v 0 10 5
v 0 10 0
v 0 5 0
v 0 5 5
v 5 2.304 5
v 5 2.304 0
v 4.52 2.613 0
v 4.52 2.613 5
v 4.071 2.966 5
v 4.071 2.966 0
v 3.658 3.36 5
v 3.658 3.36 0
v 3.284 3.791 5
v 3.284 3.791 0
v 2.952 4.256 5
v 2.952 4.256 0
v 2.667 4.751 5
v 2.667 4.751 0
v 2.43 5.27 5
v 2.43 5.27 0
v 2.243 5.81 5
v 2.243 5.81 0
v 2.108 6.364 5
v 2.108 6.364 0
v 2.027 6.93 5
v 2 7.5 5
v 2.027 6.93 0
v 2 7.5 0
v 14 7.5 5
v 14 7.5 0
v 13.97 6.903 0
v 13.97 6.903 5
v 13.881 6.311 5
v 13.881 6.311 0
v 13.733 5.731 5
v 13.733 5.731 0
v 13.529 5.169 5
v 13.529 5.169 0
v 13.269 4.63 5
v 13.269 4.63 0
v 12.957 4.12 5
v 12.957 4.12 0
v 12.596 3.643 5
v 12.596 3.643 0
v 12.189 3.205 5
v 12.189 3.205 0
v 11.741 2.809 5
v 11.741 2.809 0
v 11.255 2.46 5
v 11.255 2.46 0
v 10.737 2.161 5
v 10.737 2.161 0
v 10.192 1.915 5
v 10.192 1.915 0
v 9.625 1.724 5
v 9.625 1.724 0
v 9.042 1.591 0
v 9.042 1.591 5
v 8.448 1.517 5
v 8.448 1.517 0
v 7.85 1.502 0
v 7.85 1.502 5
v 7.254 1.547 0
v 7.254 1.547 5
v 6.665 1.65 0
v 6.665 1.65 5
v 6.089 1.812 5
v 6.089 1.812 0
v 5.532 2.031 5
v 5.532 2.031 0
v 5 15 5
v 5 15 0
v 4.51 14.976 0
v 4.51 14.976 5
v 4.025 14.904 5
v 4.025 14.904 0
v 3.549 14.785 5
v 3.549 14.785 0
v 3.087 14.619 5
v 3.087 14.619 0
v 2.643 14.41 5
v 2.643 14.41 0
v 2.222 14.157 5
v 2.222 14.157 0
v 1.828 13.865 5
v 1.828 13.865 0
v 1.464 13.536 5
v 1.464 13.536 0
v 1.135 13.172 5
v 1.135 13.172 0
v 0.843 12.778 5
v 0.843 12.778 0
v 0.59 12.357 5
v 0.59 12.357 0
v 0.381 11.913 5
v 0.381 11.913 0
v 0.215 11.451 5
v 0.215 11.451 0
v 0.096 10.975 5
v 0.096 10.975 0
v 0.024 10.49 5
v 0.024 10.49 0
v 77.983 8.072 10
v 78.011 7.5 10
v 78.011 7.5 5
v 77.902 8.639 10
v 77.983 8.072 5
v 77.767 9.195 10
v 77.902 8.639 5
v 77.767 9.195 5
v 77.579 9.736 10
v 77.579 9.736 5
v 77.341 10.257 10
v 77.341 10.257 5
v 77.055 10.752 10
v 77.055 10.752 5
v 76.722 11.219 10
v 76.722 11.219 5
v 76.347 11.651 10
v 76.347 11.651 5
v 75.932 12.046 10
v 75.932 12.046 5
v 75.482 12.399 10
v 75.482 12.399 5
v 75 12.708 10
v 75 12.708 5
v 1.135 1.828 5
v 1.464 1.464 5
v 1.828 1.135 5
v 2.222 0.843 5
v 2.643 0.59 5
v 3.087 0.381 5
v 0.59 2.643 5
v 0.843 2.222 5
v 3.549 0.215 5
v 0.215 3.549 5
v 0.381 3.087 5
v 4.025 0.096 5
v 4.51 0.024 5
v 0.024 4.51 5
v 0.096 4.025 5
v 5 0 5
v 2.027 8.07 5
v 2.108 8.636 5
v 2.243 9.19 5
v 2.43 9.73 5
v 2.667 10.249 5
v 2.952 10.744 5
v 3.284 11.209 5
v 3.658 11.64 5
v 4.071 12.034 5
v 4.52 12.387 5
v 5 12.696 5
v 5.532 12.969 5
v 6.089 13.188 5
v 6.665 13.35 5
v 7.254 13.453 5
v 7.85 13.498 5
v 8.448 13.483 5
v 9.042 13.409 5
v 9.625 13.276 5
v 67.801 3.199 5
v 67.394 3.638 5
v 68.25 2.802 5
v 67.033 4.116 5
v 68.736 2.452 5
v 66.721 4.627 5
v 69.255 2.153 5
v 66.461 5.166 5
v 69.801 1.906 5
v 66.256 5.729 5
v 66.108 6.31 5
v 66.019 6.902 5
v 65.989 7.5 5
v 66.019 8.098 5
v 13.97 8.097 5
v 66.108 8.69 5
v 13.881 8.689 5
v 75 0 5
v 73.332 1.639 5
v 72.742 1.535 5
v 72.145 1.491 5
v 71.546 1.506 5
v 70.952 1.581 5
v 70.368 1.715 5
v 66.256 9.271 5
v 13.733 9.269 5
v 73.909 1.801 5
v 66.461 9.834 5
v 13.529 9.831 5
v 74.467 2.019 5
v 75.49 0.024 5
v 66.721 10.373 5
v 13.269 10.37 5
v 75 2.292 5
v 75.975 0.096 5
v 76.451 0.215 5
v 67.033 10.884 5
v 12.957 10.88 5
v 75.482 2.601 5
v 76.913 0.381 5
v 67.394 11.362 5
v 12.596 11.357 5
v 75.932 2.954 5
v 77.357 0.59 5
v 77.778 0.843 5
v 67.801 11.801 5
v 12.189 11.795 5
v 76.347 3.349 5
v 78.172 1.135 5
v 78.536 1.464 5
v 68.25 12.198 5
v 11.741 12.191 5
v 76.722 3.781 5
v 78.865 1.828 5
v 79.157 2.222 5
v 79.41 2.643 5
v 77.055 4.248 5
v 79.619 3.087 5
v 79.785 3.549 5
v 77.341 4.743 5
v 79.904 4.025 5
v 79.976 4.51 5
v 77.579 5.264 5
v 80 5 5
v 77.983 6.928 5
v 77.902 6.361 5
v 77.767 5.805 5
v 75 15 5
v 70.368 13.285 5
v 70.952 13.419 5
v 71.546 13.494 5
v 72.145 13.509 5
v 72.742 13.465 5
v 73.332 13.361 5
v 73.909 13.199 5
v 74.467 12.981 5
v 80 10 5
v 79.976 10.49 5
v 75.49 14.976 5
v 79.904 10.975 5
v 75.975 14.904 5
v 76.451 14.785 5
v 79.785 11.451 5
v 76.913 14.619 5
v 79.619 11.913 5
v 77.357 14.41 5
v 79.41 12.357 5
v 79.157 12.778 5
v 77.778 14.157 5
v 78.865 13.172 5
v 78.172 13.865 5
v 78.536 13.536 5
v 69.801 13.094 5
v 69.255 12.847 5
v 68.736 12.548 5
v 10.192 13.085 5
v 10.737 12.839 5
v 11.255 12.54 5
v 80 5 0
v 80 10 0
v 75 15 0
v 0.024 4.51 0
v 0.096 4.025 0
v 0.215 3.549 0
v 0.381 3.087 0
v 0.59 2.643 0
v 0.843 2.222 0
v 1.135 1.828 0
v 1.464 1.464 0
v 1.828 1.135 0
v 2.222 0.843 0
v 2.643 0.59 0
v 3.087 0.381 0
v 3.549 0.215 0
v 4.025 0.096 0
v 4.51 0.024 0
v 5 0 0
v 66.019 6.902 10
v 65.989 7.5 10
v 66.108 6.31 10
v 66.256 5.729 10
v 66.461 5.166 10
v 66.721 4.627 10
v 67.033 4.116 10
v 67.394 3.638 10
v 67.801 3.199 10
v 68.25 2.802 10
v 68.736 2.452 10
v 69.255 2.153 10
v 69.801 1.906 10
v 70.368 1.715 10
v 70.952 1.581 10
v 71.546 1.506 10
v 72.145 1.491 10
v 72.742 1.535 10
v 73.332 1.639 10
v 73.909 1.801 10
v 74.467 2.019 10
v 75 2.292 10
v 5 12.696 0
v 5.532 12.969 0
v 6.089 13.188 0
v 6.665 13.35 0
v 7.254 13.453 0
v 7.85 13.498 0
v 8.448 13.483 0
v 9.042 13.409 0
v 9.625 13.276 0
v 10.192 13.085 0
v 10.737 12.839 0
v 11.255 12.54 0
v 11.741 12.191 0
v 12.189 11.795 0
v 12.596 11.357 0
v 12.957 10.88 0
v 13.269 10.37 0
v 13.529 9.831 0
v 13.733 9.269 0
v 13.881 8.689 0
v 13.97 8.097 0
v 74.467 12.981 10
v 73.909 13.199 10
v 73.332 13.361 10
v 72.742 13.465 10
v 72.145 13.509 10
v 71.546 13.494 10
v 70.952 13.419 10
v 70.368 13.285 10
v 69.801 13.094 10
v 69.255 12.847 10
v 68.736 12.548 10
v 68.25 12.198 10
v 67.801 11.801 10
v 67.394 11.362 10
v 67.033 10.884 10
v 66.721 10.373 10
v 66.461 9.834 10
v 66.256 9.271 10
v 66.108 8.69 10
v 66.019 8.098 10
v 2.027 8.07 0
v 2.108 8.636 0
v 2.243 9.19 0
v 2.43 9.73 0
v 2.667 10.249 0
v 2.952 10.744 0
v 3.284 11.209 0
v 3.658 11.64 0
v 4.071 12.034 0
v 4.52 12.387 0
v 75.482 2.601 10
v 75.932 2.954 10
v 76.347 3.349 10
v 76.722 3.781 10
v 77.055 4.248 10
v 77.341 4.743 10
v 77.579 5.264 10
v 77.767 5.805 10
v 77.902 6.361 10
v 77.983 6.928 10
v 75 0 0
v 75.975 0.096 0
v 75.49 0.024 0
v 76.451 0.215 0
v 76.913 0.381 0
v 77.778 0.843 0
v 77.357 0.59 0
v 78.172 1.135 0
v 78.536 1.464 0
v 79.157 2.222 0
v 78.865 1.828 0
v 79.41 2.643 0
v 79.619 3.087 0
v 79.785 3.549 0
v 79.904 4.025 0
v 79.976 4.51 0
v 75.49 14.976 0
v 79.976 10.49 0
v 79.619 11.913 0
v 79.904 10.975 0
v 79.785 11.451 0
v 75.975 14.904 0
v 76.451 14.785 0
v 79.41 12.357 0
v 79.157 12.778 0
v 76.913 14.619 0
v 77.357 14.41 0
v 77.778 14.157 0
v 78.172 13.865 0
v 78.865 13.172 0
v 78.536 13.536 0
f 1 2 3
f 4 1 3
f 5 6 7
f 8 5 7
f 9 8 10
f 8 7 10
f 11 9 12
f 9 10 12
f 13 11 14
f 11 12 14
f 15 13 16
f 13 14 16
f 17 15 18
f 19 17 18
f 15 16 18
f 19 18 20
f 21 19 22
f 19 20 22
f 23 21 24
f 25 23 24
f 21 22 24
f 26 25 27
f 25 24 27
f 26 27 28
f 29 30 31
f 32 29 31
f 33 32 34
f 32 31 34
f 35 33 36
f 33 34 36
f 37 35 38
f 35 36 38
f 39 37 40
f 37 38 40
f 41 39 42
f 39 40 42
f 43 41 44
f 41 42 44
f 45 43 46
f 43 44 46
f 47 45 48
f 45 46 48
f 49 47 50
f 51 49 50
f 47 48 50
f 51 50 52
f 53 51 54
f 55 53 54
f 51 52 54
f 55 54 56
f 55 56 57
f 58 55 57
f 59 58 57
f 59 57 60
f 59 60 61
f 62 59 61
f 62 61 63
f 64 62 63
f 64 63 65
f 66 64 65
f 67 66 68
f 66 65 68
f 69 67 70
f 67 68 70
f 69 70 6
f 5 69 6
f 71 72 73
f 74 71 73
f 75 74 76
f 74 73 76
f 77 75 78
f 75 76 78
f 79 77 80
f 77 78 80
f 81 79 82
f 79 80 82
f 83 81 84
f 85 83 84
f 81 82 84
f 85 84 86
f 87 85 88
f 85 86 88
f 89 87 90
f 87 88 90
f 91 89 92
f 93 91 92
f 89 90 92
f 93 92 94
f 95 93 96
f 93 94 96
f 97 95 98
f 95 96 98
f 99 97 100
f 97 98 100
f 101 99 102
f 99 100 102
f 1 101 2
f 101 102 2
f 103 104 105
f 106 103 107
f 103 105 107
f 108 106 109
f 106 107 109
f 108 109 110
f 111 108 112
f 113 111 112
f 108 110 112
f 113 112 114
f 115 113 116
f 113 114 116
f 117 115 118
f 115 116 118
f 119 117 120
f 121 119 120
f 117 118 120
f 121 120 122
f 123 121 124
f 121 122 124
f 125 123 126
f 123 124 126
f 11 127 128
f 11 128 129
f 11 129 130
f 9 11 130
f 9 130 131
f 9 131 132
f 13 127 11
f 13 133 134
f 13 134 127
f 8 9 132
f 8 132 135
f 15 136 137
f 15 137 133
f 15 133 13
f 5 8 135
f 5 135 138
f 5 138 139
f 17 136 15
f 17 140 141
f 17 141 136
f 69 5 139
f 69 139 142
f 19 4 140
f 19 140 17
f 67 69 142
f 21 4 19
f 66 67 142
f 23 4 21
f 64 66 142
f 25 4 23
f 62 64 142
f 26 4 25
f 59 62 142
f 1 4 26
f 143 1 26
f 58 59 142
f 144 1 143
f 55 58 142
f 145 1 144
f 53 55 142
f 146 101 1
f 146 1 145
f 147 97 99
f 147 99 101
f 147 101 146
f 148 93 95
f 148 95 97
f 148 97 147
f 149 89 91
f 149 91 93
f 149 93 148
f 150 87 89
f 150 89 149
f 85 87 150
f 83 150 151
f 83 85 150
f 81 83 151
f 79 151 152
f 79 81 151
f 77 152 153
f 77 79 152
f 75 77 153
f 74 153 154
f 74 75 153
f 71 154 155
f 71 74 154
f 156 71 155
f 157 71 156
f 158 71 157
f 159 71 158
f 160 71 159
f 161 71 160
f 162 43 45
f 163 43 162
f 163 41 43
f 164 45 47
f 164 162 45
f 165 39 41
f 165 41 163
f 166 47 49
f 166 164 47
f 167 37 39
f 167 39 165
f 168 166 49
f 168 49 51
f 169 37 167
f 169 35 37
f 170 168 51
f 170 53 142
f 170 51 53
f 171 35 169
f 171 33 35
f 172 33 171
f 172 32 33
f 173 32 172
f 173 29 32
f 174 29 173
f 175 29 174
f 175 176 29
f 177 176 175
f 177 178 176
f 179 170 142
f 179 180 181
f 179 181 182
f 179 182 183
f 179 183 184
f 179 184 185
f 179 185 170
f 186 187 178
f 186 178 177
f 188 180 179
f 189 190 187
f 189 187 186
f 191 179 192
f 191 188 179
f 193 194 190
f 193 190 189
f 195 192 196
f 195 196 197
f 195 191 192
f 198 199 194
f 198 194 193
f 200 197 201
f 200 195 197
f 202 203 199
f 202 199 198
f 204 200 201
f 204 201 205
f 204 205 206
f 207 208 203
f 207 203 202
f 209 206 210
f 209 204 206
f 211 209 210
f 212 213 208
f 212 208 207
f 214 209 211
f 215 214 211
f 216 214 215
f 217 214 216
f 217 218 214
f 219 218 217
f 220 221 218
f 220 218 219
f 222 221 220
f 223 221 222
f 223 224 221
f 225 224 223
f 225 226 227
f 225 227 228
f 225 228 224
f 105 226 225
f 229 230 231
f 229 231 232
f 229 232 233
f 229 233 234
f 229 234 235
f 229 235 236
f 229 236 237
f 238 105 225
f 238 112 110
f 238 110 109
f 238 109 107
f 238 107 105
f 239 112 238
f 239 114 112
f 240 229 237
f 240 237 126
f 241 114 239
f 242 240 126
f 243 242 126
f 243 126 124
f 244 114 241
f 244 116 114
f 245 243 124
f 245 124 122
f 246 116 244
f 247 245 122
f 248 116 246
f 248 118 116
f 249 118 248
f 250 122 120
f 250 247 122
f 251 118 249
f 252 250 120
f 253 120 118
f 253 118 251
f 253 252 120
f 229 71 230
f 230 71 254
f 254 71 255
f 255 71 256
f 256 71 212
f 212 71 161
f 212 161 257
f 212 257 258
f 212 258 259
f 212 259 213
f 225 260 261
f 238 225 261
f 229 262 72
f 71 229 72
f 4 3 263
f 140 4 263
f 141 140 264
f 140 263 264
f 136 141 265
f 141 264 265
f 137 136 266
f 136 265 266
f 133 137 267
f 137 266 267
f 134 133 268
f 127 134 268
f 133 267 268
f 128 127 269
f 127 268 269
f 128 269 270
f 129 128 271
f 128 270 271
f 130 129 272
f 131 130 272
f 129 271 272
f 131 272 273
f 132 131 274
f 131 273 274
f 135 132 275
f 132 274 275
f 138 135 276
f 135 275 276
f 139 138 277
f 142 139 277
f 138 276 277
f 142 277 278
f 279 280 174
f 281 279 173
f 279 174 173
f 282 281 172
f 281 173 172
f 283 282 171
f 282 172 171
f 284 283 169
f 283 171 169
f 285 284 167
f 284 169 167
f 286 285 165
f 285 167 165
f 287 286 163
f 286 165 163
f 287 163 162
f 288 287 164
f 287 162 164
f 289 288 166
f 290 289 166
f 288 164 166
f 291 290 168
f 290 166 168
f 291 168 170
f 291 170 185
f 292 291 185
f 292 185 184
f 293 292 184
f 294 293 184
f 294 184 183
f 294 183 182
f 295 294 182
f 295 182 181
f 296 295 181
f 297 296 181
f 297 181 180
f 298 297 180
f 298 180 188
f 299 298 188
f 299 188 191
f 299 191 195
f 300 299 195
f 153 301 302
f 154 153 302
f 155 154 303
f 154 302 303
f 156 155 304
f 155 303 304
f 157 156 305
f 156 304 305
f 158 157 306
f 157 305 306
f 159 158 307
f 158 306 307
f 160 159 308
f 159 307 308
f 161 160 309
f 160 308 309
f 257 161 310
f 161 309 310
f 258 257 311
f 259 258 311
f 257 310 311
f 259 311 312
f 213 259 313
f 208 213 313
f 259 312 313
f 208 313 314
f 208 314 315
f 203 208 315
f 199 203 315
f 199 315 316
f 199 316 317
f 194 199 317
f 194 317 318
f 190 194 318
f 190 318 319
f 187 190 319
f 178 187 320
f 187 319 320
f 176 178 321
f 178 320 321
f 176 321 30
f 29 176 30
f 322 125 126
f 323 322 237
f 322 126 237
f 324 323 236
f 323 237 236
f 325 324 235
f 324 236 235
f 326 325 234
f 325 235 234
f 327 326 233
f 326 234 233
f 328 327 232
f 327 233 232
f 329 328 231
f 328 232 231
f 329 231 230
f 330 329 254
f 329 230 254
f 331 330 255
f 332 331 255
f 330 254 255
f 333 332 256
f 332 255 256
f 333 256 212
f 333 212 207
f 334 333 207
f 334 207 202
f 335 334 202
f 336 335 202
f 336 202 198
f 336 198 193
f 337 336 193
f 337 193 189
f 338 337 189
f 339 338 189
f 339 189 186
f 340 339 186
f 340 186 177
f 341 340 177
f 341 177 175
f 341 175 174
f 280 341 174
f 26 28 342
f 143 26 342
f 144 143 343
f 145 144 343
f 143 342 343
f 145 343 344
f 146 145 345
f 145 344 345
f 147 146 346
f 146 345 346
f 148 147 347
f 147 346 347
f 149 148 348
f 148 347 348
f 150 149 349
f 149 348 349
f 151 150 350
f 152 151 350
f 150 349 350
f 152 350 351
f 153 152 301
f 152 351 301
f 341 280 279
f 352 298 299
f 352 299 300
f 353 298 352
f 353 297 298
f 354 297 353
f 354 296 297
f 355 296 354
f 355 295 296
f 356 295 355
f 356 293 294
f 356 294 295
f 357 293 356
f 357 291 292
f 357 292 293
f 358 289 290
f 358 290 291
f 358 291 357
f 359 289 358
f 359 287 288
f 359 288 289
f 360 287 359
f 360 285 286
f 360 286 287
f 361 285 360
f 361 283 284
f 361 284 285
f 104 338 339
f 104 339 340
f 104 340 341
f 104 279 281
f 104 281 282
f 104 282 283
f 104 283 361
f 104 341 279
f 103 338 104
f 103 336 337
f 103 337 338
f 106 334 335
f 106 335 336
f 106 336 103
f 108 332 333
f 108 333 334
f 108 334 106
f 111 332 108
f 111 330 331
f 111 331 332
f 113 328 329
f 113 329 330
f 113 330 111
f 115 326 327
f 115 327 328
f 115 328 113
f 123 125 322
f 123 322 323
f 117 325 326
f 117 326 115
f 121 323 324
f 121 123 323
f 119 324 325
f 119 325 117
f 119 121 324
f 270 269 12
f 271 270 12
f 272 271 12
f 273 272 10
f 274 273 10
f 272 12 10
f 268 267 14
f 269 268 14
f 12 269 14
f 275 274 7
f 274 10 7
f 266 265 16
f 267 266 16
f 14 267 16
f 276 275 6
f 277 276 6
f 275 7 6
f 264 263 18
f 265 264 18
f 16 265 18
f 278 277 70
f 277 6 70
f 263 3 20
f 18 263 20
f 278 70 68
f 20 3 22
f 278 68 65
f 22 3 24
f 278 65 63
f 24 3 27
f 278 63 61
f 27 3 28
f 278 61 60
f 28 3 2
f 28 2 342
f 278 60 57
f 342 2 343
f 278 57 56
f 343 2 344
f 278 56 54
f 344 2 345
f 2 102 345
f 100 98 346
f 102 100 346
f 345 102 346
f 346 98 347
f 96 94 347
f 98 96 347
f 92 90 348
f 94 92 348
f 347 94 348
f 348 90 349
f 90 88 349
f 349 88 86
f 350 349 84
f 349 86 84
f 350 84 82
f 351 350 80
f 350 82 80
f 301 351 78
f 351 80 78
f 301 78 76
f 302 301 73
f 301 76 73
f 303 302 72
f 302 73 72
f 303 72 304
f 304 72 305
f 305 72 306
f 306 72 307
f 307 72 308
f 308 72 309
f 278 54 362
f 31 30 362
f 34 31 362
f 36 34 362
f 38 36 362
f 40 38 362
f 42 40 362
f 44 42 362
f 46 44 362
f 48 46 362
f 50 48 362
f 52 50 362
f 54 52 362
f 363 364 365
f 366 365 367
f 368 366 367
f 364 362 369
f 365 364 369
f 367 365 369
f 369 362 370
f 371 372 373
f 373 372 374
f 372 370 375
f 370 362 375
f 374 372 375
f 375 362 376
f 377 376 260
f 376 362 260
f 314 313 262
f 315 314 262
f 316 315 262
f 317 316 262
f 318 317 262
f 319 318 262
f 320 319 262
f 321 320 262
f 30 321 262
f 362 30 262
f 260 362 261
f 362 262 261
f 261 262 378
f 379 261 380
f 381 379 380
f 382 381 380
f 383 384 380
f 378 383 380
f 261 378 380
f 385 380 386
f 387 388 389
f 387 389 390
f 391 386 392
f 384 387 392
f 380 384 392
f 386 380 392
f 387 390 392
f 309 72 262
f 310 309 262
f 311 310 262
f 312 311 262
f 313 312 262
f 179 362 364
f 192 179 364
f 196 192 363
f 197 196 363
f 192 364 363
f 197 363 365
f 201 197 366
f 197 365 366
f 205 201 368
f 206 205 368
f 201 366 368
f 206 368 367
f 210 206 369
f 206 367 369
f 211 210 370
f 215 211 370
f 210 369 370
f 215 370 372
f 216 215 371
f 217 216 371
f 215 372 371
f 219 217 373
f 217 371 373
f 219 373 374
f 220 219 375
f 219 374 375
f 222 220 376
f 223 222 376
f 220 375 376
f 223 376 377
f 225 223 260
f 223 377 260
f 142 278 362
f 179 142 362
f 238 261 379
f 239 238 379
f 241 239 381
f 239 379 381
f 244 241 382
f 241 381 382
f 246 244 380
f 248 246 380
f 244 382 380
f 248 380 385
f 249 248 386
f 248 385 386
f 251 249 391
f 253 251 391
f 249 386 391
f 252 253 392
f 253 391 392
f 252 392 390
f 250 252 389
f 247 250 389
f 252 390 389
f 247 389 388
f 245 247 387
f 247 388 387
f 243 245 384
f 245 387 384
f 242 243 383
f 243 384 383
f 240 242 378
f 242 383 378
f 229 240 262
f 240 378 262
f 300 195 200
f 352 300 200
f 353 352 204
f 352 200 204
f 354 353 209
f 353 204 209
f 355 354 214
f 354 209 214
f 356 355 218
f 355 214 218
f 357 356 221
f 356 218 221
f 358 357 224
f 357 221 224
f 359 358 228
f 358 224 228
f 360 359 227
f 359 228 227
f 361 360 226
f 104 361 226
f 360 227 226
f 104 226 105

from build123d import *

# Parameters (mm, degrees)
SKETCH_1_R      = 6.010671136
SKETCH_1_R_2    = 6
EXTRUDE_1_DEPTH = 5
SKETCH_1_3_R    = 6.010671136
EXTRUDE_2_DEPTH = 10


with BuildPart() as part:
    # 草图1 → 凸台-拉伸1 (new body)
    with BuildSketch(Plane.XY):
        with BuildLine():
            Line((75, 15), (5, 15))
            ThreePointArc((5, 15), (1.464466094, 13.535533906), (0, 10))
            Line((0, 10), (0, 5))
            ThreePointArc((0, 5), (1.464466094, 1.464466094), (5, 0))
            Line((5, 0), (75, 0))
            ThreePointArc((75, 0), (78.535533906, 1.464466094), (80, 5))
            Line((80, 5), (80, 10))
            ThreePointArc((80, 10), (78.535533906, 13.535533906), (75, 15))
        make_face()
        with Locations((72, 7.5)):
            Circle(SKETCH_1_R, mode=Mode.SUBTRACT)
        with Locations((8, 7.5)):
            Circle(SKETCH_1_R_2, mode=Mode.SUBTRACT)
    extrude(amount=EXTRUDE_1_DEPTH)

    # 草图1<3> → 凸台-拉伸2 (add)
    with BuildSketch(Plane.XY):
        with Locations((72, 7.5)):
            Circle(SKETCH_1_3_R)
    extrude(amount=EXTRUDE_2_DEPTH)


solid = part.part
